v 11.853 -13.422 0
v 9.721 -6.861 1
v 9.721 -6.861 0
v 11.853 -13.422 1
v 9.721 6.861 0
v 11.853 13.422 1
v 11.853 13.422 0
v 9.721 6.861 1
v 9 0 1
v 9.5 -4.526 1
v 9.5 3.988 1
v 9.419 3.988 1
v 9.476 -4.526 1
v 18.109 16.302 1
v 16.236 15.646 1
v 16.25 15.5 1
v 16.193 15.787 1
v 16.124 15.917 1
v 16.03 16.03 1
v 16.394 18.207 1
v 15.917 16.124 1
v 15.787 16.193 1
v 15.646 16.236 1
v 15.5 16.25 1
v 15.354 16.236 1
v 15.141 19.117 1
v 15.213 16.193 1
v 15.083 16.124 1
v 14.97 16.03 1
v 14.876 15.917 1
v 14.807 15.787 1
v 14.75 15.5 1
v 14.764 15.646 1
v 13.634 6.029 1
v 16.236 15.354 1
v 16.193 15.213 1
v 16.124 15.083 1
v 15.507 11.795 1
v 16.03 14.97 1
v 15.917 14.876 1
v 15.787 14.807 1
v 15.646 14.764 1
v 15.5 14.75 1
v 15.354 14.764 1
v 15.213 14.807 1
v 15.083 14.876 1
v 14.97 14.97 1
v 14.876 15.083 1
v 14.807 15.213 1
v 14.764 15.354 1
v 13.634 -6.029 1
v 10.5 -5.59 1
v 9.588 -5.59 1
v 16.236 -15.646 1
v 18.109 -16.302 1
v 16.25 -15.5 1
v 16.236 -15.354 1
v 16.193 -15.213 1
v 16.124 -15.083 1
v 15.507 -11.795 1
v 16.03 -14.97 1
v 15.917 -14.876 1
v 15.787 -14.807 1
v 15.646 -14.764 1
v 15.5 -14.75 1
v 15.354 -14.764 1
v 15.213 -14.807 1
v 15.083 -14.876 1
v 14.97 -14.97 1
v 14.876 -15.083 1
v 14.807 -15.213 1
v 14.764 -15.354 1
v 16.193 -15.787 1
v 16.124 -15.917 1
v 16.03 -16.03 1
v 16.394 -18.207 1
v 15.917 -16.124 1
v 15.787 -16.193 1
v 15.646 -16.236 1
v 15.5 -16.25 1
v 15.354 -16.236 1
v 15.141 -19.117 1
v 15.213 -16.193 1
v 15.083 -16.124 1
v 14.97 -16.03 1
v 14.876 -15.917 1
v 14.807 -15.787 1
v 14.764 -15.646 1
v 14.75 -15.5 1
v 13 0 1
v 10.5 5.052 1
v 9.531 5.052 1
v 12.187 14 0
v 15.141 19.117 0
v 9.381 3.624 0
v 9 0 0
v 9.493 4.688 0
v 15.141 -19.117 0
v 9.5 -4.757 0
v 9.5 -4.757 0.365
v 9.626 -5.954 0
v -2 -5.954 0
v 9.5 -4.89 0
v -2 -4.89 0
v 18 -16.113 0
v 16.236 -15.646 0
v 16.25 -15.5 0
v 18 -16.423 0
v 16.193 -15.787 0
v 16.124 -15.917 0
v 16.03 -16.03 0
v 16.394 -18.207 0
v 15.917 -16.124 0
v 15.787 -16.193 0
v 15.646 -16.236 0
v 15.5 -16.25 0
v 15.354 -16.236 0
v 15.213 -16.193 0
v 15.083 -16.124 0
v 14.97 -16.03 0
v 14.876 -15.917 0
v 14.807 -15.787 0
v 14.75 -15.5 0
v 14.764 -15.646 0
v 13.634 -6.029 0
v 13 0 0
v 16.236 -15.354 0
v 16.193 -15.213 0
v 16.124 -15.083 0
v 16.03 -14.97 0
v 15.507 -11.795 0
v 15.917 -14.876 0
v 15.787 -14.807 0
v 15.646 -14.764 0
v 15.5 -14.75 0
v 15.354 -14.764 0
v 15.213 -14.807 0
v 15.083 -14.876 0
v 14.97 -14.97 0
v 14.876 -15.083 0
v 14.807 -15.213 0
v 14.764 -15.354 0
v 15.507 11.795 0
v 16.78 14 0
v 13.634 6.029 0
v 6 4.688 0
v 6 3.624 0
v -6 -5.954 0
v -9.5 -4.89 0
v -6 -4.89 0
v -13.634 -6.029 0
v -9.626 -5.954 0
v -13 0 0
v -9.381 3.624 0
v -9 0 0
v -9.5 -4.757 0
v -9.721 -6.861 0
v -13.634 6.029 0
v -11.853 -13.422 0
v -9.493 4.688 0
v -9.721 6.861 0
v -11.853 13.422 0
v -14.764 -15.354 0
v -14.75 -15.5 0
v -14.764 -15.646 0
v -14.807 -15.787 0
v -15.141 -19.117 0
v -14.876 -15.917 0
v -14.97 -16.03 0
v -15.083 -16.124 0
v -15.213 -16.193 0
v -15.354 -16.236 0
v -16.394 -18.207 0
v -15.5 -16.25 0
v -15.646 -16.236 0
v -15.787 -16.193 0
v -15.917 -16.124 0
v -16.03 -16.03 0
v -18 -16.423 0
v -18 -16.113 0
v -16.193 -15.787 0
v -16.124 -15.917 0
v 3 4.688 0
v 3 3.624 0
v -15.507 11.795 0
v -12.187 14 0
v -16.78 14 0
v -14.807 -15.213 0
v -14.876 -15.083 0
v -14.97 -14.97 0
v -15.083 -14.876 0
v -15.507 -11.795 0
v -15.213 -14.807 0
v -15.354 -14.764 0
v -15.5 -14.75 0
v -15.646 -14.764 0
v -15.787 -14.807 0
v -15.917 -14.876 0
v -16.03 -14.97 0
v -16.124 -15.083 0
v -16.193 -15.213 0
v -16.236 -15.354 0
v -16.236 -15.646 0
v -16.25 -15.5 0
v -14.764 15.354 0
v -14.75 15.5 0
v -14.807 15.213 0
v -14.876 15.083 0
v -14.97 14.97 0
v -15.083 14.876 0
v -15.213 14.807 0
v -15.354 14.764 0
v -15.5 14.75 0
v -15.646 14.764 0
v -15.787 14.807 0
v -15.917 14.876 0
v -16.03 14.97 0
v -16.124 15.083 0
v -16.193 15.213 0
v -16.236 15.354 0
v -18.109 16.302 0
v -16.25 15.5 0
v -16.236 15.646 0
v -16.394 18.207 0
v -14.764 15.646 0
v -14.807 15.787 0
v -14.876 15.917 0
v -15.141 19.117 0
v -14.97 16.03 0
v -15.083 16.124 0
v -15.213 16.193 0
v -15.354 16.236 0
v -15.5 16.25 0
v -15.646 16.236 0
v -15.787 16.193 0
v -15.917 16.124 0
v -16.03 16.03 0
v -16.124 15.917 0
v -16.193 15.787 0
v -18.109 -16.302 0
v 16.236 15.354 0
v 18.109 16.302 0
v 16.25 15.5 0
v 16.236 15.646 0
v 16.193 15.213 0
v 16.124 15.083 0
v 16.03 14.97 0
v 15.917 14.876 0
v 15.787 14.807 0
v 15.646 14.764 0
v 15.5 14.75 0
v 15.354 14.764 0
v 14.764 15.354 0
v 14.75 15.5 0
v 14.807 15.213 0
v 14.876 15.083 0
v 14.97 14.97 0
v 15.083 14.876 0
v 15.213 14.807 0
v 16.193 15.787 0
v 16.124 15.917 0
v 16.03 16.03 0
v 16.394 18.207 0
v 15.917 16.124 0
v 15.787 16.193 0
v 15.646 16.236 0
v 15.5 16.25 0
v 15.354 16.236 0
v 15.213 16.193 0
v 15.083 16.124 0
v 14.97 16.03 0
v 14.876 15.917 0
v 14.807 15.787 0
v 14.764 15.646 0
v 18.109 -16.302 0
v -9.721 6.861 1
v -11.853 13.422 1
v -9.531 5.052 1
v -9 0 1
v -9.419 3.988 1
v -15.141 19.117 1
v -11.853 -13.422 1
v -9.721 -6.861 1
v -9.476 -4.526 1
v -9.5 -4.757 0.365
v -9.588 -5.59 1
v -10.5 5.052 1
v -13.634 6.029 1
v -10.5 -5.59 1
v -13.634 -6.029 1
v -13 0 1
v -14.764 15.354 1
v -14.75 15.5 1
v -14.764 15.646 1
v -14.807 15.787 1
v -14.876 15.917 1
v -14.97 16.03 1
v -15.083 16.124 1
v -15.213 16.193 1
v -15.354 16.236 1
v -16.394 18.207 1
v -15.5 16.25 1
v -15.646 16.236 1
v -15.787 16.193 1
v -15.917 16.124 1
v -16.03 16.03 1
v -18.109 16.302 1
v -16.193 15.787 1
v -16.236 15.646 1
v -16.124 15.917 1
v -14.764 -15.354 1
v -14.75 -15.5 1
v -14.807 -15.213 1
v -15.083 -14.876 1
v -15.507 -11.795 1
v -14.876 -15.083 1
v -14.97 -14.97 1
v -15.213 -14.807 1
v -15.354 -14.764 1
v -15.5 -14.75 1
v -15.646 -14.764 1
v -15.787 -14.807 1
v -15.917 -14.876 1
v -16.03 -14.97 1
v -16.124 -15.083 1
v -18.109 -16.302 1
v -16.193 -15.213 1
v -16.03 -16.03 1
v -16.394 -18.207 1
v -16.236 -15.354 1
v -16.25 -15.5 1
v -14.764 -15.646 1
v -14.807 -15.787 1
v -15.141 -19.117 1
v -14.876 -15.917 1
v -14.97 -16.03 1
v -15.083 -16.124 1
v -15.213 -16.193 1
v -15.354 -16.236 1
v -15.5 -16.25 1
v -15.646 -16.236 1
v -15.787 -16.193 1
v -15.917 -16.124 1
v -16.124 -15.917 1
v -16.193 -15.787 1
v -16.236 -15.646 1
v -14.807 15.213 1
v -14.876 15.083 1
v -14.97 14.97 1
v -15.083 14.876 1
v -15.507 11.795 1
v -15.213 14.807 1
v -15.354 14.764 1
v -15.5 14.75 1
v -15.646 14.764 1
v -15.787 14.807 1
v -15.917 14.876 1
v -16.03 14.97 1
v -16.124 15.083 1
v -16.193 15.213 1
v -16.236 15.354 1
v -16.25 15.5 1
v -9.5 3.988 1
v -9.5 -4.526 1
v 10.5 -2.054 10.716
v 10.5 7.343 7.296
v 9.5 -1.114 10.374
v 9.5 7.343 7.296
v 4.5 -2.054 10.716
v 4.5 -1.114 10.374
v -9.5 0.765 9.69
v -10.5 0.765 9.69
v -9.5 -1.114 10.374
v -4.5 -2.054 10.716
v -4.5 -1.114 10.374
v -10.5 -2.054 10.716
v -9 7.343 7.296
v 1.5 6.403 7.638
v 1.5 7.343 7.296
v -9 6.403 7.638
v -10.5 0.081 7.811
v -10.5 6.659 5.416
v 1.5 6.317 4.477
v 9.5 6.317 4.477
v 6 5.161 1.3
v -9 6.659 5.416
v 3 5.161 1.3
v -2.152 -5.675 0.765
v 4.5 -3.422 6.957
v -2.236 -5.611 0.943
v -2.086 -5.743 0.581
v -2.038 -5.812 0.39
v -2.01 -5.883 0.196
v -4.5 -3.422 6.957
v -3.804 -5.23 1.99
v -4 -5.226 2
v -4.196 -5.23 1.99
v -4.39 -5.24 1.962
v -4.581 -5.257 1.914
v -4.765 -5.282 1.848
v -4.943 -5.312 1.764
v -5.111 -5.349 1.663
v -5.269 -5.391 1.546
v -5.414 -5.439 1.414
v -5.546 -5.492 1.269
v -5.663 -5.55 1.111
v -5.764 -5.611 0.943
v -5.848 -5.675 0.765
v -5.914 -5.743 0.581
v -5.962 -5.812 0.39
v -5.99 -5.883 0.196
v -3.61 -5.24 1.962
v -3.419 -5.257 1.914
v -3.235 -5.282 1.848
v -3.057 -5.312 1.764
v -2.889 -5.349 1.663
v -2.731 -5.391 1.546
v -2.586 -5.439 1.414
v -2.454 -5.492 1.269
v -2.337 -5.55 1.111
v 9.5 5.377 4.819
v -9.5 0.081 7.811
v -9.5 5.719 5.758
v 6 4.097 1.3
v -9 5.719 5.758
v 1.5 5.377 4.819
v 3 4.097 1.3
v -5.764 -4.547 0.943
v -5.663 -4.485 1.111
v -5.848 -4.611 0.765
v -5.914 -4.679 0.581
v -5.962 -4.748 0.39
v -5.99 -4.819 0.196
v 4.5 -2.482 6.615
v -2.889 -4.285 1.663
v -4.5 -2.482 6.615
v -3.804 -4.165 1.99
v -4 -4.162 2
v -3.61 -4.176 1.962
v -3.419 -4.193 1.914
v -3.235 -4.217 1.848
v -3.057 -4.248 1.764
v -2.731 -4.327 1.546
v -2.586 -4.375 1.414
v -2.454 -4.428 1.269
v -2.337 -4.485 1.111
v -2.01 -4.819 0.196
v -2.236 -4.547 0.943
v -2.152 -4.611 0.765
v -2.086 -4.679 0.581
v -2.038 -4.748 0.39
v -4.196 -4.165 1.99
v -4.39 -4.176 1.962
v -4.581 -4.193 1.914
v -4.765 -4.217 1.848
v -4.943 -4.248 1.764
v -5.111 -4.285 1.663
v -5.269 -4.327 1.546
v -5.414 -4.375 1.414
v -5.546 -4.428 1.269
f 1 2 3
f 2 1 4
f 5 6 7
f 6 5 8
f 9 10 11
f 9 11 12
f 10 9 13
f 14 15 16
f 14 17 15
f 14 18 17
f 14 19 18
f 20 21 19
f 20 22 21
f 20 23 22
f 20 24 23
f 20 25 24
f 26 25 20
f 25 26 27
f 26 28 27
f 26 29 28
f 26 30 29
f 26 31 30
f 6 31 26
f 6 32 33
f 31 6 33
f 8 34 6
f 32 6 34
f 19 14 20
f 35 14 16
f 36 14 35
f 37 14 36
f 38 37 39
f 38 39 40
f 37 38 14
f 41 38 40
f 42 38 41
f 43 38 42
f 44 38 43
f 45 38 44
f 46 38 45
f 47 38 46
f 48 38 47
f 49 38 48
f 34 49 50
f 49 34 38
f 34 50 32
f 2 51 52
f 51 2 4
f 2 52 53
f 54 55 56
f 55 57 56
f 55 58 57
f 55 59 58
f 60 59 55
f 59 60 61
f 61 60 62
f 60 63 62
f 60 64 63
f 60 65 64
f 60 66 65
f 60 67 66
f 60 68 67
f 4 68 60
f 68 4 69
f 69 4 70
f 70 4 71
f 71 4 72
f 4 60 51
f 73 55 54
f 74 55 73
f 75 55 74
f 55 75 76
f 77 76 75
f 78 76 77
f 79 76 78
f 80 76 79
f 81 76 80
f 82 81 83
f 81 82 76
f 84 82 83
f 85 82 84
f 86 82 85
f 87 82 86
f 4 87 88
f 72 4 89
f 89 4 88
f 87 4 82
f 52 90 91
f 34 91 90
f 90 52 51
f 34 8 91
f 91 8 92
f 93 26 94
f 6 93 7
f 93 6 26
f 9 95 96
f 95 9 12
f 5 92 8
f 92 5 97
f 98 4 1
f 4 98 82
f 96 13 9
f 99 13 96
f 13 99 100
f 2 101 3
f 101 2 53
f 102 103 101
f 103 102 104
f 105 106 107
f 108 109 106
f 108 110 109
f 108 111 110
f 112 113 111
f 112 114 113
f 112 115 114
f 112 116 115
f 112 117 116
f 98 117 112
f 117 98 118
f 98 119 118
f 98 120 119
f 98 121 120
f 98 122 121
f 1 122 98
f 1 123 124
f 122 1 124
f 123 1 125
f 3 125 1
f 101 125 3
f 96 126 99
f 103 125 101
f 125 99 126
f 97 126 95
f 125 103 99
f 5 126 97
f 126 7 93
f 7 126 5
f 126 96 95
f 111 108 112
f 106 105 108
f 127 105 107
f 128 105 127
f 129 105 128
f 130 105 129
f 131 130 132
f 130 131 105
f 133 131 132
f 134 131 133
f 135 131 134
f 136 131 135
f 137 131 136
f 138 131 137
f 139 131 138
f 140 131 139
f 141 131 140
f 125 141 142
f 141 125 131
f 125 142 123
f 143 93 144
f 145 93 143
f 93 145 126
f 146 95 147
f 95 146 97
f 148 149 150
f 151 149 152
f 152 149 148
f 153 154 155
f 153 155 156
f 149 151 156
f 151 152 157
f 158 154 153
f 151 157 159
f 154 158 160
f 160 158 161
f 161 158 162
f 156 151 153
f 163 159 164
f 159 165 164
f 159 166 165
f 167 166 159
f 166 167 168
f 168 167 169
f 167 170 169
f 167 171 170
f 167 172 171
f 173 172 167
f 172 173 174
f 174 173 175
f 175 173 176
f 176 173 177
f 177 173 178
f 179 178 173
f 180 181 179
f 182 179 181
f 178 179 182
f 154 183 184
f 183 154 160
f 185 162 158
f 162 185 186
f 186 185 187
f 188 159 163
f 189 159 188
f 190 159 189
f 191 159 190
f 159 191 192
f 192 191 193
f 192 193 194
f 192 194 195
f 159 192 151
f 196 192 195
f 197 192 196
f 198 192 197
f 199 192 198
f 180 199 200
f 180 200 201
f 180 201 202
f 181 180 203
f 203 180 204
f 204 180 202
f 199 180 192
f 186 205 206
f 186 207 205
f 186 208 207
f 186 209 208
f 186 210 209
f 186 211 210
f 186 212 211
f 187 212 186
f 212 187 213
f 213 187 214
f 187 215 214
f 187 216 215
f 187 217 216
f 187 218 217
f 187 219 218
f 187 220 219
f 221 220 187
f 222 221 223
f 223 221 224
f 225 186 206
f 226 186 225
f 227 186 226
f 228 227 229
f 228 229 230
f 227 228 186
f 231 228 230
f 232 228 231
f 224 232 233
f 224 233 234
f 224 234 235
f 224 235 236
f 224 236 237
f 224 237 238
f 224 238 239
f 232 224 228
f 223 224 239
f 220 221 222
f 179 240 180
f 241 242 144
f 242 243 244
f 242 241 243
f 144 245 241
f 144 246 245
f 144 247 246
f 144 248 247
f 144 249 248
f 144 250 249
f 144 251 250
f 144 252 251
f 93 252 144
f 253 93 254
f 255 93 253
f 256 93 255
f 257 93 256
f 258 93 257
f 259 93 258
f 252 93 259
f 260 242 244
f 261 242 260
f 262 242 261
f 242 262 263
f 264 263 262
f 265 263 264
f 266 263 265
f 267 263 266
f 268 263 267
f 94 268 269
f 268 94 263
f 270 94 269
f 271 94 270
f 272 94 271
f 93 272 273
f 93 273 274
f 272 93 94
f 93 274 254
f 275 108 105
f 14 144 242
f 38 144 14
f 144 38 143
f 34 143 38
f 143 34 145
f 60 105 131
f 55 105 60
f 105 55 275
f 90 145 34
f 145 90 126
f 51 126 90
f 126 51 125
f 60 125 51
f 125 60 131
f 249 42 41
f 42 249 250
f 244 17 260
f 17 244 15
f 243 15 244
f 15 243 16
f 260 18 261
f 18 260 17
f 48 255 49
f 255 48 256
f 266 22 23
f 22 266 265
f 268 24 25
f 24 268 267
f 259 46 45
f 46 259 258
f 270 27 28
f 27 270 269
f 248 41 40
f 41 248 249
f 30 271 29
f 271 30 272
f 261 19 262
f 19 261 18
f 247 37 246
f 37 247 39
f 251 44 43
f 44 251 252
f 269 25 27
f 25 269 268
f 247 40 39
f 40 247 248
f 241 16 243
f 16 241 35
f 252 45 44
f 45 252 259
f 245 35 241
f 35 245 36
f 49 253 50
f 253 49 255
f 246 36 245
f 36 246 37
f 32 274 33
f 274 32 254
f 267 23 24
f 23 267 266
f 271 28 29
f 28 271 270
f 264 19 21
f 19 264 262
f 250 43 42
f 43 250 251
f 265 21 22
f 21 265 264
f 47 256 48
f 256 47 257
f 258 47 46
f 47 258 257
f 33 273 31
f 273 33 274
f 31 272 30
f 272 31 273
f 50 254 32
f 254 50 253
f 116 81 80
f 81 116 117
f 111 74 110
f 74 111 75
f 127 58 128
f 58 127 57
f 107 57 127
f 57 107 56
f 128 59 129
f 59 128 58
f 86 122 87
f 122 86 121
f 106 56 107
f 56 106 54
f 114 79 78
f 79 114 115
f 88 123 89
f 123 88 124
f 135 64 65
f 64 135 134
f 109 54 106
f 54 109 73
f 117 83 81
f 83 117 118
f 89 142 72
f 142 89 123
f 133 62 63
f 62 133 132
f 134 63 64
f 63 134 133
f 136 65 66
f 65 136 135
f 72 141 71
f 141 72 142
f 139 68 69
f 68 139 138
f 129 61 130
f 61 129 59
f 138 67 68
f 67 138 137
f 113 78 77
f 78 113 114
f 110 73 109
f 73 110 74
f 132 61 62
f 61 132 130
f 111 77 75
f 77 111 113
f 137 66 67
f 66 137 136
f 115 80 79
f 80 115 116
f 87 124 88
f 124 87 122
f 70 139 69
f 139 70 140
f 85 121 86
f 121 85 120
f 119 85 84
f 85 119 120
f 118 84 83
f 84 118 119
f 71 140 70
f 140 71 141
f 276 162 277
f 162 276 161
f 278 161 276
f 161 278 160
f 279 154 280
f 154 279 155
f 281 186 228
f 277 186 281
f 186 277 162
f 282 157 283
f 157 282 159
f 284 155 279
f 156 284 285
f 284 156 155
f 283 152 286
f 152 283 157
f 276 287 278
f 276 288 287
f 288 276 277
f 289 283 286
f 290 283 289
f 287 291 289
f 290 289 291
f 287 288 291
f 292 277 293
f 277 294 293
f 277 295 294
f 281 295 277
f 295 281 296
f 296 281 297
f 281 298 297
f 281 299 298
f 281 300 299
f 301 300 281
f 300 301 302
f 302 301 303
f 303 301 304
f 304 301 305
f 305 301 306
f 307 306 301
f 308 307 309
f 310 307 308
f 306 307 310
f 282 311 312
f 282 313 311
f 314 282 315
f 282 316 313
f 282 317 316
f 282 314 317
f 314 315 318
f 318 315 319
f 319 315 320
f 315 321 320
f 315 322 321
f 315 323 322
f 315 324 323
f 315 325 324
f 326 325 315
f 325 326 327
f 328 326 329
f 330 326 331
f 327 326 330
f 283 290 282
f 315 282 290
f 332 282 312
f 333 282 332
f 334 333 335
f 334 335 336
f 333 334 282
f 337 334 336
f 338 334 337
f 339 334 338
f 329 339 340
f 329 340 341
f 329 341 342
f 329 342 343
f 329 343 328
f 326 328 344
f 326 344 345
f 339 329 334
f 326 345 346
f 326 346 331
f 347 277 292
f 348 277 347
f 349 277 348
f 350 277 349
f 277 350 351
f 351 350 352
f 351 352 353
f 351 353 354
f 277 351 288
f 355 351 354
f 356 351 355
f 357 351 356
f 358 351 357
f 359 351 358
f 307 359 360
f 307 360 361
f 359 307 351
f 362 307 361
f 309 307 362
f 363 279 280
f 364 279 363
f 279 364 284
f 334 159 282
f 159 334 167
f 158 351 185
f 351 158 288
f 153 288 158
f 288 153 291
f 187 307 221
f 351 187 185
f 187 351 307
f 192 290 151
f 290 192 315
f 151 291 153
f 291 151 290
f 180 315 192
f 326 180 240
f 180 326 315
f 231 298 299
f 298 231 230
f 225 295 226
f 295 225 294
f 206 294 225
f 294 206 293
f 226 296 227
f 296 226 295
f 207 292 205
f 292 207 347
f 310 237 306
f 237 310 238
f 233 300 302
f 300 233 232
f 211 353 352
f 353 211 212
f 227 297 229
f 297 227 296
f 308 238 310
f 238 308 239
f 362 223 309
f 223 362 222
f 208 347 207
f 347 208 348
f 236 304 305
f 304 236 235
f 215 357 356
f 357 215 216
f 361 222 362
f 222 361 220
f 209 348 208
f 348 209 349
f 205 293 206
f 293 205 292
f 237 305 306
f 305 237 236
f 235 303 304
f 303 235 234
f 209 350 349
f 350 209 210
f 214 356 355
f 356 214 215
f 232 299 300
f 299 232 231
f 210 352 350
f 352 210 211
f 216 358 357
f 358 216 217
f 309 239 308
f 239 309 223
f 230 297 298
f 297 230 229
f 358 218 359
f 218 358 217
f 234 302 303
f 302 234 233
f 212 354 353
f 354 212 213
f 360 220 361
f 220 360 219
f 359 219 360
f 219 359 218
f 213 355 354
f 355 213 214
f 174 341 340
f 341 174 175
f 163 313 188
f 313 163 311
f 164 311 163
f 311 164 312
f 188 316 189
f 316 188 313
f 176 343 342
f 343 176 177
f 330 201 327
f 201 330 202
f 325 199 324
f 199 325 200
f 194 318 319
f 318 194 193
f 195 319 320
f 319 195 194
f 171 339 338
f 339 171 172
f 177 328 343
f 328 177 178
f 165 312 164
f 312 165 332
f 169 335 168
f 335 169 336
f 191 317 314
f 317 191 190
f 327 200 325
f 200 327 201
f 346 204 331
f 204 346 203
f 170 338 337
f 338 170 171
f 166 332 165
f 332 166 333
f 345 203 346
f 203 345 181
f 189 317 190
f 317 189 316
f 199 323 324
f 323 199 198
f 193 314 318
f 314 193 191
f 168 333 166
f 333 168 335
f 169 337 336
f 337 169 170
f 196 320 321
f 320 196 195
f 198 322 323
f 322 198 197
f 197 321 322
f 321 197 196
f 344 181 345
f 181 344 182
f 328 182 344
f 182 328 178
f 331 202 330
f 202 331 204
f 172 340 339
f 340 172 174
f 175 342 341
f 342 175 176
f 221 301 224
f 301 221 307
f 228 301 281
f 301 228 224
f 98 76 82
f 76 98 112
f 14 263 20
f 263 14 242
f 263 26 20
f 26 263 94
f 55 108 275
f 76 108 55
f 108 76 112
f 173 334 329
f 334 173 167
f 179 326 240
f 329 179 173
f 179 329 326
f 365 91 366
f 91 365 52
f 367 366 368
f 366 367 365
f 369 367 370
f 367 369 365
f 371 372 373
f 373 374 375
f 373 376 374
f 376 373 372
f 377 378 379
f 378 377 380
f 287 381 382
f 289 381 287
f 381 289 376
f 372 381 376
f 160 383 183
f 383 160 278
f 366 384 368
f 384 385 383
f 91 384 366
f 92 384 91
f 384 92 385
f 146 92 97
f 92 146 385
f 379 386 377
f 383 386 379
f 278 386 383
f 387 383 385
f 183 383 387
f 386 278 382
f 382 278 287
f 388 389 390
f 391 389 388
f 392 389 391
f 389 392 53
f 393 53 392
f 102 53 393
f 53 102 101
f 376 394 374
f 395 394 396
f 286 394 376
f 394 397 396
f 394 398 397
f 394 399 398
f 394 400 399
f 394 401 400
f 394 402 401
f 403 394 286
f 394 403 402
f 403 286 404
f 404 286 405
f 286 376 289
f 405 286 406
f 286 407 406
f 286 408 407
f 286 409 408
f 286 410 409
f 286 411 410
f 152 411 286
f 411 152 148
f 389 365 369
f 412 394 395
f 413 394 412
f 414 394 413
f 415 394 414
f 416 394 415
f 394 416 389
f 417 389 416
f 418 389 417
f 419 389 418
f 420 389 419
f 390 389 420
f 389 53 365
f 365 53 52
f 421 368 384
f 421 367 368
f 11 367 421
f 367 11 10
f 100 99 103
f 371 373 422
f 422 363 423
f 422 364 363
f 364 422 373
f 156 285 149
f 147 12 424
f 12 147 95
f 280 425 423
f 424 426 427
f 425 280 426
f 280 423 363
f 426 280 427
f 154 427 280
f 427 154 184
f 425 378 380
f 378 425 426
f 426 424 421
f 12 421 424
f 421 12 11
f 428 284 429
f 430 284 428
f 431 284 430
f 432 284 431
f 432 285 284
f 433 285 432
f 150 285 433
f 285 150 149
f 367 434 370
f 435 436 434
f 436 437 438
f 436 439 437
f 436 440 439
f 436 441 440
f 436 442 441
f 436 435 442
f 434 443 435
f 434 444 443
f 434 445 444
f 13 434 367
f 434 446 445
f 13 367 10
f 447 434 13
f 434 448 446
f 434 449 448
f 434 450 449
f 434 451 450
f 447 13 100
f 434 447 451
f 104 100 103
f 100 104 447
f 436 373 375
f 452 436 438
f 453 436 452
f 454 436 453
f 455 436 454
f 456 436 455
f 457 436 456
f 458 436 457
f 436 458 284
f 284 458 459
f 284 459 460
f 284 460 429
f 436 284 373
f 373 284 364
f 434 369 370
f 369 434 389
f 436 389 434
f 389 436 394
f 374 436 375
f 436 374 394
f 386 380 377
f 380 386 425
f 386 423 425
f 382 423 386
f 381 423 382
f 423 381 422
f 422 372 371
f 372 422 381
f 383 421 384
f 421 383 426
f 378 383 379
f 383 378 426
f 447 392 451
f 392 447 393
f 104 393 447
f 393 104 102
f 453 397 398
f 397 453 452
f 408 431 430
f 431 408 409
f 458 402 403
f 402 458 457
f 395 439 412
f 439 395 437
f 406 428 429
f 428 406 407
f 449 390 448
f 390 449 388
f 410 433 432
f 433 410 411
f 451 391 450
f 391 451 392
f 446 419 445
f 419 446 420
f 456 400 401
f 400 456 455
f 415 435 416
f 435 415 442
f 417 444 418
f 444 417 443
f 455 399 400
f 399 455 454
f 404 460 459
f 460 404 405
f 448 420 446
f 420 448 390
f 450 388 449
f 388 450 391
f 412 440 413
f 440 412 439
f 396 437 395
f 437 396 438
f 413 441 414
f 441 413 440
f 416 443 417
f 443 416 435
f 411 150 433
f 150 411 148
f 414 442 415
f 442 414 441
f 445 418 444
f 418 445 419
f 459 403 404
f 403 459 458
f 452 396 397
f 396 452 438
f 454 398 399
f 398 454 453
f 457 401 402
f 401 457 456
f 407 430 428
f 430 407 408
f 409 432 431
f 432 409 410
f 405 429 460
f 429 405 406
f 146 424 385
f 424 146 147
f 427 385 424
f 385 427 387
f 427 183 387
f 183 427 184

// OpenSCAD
// Eachine TX01 mount


module tx01_mount() {

    difference() {
        union() {
            color("blue") h8_bottom_plate();
            color("red") translate ([-10.5,-6.5,-1.5]) rotate ([-20,0,0]) tx01_box();
        }
        // xtal cutout
        translate ([-4,-3,0]) rotate([90,0,0])
            cylinder(r=2, h=8, center=true, $fn=64);
        // cap cutout
        translate ([3,2,-0.2]) cube([3,5,1.5]);
        // bottom cutoff
        translate ([-18,-22,-36]) cube(36);
    }
}

module tx01_box() {
    difference() {
        cube([21,10,13]);
        //inner
        translate ([1,1,-0.5]) cube([19,8,14]);
        
        translate ([6,-0.5,9]) cube([9,2,5]);
        translate ([-0.5,3,11]) cube ([2,8.5,3]);
        translate ([12,8.5,10]) cube ([8,2,4]);
    }
}


module h8_bottom_plate() {
    difference() {
        union() {
            // arc left
            difference() {
                translate([42,0,0.5])
                    difference() {
                        cylinder(r=33, h=1, center=true);
                        cylinder(r=29, h=2, center=true);
                    }
                //holes
                translate([15.5,15.5,-0.75]) cylinder(r=0.75, h=2,$fn=32);
                translate([15.5,-15.5,-0.75]) cylinder(r=0.75, h=2,$fn=32); 
            }
            // arc right
            difference() {
                translate([-42,0,0.5])
                    difference() {
                        cylinder(r=33, h=1, center=true);
                        cylinder(r=29, h=2, center=true);
                    }
                //holes
                translate([-15.5,15.5,-0.75]) cylinder(r=0.75, h=2,$fn=32);
                translate([-15.5,-15.5,-0.75]) cylinder(r=0.75, h=2,$fn=32); 
            }
        }
        difference() {            
            cylinder(r=76, h=3, center=true);
            cylinder(r=24.5, h=4, center=true);
        }
    }
    
    // rear beam
    //translate([0,8.5,.5]) cube([25,1,1], center=true);
}

tx01_mount();
//rotate ([0,0,45]) translate([0,0,-3]) import("h8framefinal.stl");
